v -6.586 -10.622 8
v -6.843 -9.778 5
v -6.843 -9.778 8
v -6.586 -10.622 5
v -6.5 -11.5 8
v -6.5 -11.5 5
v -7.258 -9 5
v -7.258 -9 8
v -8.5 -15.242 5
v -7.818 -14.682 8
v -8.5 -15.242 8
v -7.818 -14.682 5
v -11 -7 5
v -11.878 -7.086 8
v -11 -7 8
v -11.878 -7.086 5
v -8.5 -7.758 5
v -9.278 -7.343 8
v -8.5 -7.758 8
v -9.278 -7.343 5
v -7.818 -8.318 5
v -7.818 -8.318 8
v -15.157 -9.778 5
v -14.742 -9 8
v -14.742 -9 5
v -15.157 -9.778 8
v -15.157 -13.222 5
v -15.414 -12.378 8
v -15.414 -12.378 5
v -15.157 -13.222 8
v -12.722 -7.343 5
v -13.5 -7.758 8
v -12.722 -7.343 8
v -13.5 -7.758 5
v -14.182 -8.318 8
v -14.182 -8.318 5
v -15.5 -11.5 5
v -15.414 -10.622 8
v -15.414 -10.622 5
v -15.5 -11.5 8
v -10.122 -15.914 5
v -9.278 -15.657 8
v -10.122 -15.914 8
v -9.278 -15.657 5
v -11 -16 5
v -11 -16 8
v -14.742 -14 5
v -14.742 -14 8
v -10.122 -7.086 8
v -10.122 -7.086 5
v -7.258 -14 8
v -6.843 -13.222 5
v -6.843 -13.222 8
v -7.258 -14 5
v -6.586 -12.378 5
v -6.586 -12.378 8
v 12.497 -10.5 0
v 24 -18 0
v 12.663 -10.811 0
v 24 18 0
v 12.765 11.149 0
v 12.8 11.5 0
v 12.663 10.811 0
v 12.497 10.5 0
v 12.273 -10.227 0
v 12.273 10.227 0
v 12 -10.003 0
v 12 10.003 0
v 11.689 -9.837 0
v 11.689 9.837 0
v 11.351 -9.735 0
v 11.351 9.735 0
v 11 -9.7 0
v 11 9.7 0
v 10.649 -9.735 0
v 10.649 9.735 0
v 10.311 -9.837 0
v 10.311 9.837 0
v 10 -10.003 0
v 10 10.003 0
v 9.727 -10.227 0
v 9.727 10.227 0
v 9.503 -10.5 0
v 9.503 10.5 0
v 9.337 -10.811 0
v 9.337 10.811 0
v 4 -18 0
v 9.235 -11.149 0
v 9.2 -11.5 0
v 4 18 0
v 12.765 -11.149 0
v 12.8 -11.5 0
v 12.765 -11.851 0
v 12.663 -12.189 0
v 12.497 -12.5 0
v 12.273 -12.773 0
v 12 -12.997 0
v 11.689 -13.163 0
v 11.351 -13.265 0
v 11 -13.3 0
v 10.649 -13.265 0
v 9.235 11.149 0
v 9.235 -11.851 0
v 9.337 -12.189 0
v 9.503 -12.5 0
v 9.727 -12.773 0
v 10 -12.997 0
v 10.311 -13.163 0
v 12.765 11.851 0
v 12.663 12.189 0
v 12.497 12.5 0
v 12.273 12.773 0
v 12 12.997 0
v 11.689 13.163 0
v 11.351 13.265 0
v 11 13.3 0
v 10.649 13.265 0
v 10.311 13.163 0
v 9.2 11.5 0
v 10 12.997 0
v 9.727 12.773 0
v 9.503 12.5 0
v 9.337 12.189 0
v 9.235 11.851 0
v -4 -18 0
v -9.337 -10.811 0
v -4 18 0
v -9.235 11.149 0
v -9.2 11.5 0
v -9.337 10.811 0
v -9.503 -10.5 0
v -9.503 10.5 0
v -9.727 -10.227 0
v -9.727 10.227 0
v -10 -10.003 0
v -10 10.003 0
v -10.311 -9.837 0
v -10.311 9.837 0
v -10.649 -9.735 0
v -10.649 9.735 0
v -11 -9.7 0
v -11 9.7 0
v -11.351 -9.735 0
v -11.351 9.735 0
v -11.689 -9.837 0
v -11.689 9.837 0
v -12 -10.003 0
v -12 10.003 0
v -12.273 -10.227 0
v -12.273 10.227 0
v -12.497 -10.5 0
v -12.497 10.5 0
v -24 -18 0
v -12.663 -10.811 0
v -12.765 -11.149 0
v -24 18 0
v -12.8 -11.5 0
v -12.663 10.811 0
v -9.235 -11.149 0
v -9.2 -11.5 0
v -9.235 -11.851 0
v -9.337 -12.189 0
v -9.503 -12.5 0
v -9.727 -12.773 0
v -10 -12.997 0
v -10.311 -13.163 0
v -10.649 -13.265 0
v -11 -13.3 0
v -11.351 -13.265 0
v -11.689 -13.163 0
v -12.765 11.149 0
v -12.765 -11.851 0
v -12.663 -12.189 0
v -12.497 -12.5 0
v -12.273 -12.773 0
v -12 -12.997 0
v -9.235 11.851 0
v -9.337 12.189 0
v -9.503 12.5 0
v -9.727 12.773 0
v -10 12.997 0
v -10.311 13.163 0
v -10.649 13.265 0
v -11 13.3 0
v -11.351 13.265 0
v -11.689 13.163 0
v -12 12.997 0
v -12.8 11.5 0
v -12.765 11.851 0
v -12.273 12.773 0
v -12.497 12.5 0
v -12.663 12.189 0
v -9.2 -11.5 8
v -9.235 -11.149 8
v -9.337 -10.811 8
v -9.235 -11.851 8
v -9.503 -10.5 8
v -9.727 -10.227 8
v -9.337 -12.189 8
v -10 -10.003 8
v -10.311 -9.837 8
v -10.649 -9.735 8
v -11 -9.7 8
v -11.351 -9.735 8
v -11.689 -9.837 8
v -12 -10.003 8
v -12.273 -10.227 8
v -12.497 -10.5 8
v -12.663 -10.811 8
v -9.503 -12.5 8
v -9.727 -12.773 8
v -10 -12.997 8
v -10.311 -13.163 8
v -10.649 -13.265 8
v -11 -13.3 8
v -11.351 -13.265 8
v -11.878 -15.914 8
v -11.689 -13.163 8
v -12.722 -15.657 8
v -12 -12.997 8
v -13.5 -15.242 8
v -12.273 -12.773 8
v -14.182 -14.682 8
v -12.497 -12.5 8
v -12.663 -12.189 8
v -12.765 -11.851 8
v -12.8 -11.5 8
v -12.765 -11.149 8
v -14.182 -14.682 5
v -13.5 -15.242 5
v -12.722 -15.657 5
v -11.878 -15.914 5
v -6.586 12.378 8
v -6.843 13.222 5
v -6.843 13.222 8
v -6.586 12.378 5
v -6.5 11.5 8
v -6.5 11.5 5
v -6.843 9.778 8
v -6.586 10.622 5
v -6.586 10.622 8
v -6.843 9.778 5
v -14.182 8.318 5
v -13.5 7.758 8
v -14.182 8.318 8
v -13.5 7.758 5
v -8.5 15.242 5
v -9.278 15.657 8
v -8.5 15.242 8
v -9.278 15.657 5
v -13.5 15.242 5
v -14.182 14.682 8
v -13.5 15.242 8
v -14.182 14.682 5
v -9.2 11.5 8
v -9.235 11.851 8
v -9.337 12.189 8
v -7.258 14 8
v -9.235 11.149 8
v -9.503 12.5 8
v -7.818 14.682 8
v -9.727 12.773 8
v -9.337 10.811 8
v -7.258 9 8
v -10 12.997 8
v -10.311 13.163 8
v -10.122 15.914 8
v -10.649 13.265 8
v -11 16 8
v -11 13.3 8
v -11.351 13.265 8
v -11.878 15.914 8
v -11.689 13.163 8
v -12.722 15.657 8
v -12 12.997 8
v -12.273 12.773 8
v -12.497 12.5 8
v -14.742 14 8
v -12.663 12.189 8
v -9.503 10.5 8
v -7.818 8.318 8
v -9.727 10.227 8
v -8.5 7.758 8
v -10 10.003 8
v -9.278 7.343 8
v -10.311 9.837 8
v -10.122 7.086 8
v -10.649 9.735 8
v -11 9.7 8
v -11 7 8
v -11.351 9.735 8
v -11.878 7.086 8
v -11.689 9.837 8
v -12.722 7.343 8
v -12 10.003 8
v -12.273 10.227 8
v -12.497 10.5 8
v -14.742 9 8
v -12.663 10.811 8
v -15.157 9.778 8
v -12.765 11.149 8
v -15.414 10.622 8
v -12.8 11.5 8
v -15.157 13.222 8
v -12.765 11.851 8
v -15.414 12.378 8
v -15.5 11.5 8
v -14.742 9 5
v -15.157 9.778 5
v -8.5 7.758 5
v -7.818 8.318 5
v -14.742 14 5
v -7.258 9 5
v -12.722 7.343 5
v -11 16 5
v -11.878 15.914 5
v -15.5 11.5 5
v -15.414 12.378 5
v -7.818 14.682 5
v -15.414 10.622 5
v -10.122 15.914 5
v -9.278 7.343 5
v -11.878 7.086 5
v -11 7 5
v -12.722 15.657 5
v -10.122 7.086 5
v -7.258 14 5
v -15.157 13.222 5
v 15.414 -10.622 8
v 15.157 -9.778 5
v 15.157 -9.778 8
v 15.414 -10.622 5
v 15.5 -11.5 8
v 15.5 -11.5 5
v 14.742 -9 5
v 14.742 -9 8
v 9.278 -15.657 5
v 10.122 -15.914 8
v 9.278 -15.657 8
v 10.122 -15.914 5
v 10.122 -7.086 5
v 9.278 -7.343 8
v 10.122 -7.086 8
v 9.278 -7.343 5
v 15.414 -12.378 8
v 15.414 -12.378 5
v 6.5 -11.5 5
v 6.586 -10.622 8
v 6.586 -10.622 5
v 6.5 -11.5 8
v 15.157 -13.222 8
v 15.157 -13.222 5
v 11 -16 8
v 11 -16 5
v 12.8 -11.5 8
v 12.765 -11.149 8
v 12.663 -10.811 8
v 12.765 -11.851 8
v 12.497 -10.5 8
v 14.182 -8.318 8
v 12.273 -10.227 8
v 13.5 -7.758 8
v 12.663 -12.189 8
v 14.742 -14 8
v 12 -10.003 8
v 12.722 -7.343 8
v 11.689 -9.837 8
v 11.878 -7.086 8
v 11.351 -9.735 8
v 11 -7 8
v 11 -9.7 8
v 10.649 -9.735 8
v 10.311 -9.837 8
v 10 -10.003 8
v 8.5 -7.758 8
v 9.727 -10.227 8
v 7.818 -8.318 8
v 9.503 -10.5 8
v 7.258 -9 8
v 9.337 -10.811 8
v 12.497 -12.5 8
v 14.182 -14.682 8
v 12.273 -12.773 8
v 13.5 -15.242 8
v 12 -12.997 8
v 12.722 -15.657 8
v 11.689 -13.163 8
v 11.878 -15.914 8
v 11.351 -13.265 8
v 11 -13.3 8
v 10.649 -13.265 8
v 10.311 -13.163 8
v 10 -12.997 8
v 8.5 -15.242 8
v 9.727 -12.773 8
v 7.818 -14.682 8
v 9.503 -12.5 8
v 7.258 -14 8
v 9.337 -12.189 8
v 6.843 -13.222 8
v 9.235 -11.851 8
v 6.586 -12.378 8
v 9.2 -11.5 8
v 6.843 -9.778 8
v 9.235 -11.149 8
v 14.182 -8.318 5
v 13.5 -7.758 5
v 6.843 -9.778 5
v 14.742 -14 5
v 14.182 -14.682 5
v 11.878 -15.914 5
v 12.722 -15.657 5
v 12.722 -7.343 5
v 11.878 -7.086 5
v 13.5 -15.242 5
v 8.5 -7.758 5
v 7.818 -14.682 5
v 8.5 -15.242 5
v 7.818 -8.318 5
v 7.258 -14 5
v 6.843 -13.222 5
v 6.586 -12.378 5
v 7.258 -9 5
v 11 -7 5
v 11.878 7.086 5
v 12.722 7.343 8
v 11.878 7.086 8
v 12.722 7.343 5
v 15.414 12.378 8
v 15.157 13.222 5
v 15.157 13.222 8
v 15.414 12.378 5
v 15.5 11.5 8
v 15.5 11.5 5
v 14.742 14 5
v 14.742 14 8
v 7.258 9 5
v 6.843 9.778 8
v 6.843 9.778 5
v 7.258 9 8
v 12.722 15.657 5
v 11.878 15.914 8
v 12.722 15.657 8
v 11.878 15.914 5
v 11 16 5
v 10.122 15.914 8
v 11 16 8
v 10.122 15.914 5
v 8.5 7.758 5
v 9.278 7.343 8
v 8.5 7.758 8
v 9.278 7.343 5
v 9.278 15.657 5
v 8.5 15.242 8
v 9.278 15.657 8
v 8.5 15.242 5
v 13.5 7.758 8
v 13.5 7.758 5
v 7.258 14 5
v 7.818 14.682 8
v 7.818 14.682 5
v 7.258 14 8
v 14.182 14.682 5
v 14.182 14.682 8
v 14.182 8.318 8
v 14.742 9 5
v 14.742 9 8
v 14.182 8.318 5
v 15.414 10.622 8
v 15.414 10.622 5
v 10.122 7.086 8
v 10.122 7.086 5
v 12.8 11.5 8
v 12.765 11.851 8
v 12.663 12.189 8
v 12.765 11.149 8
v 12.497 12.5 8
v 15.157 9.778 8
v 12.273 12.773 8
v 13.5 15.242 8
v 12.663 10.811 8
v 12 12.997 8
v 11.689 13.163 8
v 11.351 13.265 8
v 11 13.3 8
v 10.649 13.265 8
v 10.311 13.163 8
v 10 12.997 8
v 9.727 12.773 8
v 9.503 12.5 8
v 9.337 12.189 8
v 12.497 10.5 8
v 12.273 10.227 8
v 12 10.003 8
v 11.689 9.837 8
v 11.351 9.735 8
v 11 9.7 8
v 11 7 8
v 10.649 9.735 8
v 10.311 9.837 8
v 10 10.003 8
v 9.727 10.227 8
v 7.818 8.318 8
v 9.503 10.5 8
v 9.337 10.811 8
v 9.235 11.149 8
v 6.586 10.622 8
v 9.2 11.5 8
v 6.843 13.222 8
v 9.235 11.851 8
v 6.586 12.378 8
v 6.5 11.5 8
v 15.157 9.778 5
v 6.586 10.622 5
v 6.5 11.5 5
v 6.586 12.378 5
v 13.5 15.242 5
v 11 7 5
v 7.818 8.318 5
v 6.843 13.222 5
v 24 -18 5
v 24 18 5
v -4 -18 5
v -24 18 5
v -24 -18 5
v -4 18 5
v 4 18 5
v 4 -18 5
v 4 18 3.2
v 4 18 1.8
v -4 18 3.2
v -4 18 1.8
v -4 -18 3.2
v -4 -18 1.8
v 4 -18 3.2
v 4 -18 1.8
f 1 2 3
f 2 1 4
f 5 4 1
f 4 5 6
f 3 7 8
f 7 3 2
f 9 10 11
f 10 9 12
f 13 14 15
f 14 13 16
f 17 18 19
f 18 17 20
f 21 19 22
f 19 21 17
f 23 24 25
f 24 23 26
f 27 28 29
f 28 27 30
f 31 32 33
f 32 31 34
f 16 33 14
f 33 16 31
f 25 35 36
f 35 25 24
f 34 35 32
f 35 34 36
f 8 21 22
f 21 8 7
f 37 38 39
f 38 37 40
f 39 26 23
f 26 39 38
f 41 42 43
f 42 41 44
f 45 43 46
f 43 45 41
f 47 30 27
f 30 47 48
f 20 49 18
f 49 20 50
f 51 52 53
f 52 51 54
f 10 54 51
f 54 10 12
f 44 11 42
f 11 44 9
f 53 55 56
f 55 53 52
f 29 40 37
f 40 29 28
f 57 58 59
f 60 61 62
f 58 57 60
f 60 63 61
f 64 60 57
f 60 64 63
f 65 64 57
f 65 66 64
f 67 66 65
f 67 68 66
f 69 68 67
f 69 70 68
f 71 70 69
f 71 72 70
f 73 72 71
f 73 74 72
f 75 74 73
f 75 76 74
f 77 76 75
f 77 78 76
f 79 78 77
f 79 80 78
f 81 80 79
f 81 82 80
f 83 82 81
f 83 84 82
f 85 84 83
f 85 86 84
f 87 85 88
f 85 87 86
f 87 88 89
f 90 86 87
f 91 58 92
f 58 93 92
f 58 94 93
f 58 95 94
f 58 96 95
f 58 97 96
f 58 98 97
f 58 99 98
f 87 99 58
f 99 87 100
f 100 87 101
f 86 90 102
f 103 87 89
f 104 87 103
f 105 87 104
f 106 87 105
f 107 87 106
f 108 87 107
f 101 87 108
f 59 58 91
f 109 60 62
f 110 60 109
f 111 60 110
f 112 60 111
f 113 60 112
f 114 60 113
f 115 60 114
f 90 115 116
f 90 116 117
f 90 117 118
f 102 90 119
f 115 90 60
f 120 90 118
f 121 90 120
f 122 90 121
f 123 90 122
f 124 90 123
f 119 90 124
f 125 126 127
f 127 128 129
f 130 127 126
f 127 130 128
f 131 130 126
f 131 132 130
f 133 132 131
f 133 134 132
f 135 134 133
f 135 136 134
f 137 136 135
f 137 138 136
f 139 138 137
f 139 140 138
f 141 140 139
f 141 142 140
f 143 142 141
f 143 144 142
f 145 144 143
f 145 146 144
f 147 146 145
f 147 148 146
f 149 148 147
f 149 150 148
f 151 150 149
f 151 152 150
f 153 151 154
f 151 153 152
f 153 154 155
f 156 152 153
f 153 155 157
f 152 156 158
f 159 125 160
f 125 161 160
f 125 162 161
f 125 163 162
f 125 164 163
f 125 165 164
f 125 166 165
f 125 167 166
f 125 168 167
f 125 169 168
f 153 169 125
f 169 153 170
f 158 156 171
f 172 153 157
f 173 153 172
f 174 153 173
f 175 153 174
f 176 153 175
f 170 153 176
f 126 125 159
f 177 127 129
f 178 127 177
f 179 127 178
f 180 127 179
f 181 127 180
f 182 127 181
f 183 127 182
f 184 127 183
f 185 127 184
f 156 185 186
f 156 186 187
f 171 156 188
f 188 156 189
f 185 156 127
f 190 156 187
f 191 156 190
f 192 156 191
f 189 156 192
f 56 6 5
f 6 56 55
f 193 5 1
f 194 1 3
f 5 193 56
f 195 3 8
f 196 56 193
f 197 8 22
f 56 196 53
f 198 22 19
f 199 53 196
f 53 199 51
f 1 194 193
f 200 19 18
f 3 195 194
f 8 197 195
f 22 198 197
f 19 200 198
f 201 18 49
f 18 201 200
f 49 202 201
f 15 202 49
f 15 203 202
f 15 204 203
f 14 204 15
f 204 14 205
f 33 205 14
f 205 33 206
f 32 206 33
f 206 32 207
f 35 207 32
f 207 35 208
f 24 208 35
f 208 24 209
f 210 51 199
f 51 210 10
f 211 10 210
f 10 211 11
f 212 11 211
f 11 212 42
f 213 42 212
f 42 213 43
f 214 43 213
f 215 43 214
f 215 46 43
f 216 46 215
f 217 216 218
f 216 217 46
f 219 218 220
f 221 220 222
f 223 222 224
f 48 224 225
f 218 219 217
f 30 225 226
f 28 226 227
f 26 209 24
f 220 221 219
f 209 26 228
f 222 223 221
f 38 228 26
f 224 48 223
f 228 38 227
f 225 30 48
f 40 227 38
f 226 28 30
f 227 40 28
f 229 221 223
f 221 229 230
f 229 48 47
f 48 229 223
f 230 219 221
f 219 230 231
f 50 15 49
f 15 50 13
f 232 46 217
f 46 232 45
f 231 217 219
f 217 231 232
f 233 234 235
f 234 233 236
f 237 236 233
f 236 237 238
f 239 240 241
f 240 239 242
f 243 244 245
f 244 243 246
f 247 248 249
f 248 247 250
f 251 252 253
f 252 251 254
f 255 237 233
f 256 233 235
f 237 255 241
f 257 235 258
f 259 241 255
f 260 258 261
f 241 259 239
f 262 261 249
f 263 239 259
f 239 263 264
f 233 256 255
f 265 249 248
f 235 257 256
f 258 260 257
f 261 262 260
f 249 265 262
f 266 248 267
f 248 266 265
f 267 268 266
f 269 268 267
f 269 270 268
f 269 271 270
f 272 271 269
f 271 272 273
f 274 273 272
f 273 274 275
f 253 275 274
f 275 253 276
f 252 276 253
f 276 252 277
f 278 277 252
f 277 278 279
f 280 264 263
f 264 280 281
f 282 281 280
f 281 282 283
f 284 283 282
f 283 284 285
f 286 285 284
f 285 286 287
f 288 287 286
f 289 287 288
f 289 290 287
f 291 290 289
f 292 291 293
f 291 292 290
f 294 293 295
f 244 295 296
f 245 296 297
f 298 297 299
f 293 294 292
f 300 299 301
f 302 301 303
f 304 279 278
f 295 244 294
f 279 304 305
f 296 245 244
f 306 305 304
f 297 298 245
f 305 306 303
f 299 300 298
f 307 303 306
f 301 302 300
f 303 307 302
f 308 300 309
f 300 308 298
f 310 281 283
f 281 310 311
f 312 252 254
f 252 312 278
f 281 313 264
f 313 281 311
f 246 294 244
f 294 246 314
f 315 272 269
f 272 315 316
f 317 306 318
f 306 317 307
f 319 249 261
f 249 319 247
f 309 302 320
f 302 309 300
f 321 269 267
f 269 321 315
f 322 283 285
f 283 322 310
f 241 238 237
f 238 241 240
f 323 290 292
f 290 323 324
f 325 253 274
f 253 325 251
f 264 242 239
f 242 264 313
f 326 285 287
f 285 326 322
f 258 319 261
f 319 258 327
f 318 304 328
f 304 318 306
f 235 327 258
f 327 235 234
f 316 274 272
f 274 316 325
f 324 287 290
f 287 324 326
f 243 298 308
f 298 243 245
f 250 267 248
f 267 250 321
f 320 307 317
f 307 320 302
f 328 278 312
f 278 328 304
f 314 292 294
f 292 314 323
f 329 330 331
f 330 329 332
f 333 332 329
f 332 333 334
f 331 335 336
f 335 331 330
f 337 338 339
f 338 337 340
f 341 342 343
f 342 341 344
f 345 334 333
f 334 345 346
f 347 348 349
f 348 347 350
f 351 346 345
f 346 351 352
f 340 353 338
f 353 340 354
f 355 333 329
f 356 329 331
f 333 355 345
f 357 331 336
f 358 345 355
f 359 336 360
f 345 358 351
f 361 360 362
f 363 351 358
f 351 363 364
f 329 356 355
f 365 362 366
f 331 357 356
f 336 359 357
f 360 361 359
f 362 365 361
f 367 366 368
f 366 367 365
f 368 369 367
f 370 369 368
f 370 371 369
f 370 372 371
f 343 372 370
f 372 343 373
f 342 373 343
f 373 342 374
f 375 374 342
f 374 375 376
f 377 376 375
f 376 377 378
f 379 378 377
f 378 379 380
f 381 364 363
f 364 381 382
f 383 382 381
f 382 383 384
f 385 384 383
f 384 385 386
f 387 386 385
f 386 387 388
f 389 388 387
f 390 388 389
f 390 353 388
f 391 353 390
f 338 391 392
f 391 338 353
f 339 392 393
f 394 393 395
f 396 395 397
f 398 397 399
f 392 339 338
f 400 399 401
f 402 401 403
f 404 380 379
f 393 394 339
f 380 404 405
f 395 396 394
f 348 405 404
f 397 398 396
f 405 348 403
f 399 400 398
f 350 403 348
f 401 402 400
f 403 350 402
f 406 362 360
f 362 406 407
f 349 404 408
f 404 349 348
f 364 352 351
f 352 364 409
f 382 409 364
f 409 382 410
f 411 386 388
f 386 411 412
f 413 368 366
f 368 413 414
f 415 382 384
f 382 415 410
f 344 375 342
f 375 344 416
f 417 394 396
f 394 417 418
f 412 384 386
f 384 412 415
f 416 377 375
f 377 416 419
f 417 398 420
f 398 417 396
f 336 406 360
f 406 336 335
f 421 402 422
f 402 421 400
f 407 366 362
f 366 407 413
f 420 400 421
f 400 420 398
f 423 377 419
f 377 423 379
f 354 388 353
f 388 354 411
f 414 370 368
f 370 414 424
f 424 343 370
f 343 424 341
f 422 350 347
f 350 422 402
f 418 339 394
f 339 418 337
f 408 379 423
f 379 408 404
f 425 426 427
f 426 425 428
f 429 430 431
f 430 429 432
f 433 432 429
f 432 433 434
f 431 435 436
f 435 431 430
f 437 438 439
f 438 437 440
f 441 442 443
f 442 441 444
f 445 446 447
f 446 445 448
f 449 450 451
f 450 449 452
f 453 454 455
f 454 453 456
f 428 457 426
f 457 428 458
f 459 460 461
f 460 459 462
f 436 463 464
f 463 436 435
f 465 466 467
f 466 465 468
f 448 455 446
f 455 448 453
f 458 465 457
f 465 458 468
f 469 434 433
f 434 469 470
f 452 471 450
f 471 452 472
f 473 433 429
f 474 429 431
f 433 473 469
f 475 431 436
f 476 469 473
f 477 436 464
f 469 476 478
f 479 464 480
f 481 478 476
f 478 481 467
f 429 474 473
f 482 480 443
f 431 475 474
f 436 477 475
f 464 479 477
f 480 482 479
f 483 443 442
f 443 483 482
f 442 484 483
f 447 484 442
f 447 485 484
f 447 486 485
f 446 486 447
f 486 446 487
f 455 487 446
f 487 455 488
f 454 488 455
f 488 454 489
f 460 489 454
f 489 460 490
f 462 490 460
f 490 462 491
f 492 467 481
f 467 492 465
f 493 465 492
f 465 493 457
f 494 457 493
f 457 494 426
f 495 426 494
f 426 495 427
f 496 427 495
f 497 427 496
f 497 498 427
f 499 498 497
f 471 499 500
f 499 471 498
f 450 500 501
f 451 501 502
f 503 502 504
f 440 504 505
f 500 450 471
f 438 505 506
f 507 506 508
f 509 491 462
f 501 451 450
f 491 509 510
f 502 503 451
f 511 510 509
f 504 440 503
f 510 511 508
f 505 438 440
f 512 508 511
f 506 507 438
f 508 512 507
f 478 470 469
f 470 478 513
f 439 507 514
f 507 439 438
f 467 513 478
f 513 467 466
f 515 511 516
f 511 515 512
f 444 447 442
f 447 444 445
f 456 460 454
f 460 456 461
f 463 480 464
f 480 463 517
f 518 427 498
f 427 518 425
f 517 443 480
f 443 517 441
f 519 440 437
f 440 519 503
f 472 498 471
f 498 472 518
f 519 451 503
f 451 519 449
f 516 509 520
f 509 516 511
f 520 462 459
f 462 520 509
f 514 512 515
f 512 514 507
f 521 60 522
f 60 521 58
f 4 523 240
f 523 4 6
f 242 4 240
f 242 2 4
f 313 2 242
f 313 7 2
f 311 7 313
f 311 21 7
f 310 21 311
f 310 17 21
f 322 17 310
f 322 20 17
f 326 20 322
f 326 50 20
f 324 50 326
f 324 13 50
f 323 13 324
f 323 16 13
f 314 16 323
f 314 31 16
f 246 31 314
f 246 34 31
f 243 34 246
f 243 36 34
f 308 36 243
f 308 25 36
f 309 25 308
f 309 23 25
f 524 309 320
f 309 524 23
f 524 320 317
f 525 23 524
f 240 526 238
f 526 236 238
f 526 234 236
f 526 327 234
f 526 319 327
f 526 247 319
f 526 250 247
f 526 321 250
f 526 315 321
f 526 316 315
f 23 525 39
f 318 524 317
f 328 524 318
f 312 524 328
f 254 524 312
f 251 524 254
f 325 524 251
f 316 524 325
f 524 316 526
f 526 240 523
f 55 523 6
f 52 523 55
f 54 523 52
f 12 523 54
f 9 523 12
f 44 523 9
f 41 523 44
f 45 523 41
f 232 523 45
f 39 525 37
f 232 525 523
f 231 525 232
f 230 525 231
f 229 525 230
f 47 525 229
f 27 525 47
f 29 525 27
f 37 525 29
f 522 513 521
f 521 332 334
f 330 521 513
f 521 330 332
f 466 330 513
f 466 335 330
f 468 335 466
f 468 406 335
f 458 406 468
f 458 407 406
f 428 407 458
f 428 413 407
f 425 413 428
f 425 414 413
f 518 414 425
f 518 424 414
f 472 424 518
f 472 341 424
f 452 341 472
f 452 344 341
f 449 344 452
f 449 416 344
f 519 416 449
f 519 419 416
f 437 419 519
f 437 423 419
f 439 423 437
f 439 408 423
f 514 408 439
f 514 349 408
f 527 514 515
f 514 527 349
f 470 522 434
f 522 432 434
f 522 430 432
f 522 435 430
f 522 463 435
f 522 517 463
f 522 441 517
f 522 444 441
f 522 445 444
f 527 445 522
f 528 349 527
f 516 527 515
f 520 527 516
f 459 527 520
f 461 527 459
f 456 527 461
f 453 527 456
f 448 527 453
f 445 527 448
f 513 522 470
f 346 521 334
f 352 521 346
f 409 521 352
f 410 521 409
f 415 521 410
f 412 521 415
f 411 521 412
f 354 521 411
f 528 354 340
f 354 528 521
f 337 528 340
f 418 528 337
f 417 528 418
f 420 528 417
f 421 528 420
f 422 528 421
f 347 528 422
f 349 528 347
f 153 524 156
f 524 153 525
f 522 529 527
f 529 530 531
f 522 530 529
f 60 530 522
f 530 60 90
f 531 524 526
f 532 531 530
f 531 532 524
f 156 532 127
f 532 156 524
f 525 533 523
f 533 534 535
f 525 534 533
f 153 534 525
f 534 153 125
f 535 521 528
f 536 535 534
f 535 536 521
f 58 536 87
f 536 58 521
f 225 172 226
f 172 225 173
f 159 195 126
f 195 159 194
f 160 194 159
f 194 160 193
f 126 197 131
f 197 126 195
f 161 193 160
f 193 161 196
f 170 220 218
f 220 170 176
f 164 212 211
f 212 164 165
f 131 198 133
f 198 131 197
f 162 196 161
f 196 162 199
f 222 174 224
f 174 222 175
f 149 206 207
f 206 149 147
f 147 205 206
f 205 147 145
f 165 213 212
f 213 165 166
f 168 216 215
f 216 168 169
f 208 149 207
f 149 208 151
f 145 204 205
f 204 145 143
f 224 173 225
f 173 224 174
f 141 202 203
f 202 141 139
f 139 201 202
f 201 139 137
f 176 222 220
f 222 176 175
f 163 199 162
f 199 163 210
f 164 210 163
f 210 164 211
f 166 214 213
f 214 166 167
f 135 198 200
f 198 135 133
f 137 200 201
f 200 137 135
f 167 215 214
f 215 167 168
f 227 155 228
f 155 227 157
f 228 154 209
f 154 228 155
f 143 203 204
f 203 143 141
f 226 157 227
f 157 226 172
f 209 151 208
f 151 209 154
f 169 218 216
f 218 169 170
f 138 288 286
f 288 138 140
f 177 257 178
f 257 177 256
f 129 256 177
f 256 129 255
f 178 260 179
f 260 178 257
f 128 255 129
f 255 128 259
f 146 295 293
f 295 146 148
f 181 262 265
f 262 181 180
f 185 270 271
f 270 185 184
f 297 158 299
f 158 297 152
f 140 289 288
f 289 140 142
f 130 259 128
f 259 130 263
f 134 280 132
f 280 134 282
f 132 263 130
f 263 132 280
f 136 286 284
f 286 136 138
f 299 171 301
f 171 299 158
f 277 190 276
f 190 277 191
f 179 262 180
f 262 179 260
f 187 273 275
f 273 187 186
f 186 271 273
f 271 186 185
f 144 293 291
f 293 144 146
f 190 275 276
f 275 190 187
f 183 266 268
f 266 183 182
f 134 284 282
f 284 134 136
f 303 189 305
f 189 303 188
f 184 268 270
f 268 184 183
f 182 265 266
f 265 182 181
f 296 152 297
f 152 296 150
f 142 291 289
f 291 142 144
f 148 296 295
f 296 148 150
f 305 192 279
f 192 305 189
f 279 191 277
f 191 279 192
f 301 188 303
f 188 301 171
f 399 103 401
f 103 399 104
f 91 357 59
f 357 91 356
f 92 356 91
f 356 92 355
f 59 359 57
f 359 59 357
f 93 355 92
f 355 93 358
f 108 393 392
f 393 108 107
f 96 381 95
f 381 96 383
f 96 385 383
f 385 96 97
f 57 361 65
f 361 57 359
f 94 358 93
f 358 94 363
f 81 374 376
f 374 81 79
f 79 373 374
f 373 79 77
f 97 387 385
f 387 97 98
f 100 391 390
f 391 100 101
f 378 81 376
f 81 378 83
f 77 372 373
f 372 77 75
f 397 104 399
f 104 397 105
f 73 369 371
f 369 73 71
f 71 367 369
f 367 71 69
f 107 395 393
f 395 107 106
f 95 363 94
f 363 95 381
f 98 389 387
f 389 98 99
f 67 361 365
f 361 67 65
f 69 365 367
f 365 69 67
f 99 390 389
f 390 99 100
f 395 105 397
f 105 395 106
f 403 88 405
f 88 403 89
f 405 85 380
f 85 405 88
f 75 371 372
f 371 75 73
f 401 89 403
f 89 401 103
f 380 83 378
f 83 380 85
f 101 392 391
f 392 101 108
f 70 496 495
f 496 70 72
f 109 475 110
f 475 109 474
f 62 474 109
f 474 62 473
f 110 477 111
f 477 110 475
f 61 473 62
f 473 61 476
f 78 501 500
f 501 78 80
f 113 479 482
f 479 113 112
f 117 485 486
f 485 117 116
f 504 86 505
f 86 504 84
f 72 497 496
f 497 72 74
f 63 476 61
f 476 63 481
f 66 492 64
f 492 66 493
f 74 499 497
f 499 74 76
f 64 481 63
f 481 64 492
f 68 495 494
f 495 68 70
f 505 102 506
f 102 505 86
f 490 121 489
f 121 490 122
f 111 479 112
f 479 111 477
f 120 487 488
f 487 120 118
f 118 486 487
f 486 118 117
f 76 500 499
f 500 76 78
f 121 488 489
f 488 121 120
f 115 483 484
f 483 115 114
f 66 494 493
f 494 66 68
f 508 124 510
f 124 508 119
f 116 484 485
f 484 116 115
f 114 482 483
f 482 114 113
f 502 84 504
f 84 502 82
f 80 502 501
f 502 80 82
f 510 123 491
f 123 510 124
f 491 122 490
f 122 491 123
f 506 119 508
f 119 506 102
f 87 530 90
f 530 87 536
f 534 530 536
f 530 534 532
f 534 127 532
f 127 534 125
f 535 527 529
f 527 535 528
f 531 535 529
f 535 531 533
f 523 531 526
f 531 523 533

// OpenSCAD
$fn = 32;

// ----------------------------------------------------------------------
// Living hinge: 48 x 36 mm plates, 1.4 mm flexible web
// ----------------------------------------------------------------------

// --- parameters (mm) ---
plate_len = 20;           // plate length outside the web
plate_w = 36;             // plate width
thick = 5;                // plate thickness
web_half = 4;             // half width of the flex band
web_t = 1.4;              // flexible web thickness
web_z = 1.8;              // web position inside the thickness
boss_d = 9;               // screw boss diameter
boss_h = 8;               // screw boss height
boss_x = 11;              // screw boss distance from the web
screw_d = 3.6;            // screw hole

difference() {
  union() {
    /* one flat strip, later thinned at the middle */
    translate([-24, -18, 0]) cube([48, 36, 5]);
    /* screw bosses, sunk 0.5 mm into the plates */
    for (sx = [-11, 11]) {
      for (sy = [-11.5, 11.5]) {
        translate([sx, sy, 0]) cylinder(h = boss_h, d = boss_d);
      }
    }
  }
  /* channel from below: leaves the web on top of it */
  translate([-4, -20.5, -2.5]) cube([8, 41, 4.3]);
  /* channel from above: thins the web down to web_t */
  translate([-4, -20.5, 3.2]) cube([8, 41, 4.3]);
  /* screw holes through the bosses */
  for (sx = [-11, 11]) {
    for (sy = [-11.5, 11.5]) {
      translate([sx, sy, -2.5]) cylinder(h = boss_h + 5, d = screw_d);
    }
  }
}
